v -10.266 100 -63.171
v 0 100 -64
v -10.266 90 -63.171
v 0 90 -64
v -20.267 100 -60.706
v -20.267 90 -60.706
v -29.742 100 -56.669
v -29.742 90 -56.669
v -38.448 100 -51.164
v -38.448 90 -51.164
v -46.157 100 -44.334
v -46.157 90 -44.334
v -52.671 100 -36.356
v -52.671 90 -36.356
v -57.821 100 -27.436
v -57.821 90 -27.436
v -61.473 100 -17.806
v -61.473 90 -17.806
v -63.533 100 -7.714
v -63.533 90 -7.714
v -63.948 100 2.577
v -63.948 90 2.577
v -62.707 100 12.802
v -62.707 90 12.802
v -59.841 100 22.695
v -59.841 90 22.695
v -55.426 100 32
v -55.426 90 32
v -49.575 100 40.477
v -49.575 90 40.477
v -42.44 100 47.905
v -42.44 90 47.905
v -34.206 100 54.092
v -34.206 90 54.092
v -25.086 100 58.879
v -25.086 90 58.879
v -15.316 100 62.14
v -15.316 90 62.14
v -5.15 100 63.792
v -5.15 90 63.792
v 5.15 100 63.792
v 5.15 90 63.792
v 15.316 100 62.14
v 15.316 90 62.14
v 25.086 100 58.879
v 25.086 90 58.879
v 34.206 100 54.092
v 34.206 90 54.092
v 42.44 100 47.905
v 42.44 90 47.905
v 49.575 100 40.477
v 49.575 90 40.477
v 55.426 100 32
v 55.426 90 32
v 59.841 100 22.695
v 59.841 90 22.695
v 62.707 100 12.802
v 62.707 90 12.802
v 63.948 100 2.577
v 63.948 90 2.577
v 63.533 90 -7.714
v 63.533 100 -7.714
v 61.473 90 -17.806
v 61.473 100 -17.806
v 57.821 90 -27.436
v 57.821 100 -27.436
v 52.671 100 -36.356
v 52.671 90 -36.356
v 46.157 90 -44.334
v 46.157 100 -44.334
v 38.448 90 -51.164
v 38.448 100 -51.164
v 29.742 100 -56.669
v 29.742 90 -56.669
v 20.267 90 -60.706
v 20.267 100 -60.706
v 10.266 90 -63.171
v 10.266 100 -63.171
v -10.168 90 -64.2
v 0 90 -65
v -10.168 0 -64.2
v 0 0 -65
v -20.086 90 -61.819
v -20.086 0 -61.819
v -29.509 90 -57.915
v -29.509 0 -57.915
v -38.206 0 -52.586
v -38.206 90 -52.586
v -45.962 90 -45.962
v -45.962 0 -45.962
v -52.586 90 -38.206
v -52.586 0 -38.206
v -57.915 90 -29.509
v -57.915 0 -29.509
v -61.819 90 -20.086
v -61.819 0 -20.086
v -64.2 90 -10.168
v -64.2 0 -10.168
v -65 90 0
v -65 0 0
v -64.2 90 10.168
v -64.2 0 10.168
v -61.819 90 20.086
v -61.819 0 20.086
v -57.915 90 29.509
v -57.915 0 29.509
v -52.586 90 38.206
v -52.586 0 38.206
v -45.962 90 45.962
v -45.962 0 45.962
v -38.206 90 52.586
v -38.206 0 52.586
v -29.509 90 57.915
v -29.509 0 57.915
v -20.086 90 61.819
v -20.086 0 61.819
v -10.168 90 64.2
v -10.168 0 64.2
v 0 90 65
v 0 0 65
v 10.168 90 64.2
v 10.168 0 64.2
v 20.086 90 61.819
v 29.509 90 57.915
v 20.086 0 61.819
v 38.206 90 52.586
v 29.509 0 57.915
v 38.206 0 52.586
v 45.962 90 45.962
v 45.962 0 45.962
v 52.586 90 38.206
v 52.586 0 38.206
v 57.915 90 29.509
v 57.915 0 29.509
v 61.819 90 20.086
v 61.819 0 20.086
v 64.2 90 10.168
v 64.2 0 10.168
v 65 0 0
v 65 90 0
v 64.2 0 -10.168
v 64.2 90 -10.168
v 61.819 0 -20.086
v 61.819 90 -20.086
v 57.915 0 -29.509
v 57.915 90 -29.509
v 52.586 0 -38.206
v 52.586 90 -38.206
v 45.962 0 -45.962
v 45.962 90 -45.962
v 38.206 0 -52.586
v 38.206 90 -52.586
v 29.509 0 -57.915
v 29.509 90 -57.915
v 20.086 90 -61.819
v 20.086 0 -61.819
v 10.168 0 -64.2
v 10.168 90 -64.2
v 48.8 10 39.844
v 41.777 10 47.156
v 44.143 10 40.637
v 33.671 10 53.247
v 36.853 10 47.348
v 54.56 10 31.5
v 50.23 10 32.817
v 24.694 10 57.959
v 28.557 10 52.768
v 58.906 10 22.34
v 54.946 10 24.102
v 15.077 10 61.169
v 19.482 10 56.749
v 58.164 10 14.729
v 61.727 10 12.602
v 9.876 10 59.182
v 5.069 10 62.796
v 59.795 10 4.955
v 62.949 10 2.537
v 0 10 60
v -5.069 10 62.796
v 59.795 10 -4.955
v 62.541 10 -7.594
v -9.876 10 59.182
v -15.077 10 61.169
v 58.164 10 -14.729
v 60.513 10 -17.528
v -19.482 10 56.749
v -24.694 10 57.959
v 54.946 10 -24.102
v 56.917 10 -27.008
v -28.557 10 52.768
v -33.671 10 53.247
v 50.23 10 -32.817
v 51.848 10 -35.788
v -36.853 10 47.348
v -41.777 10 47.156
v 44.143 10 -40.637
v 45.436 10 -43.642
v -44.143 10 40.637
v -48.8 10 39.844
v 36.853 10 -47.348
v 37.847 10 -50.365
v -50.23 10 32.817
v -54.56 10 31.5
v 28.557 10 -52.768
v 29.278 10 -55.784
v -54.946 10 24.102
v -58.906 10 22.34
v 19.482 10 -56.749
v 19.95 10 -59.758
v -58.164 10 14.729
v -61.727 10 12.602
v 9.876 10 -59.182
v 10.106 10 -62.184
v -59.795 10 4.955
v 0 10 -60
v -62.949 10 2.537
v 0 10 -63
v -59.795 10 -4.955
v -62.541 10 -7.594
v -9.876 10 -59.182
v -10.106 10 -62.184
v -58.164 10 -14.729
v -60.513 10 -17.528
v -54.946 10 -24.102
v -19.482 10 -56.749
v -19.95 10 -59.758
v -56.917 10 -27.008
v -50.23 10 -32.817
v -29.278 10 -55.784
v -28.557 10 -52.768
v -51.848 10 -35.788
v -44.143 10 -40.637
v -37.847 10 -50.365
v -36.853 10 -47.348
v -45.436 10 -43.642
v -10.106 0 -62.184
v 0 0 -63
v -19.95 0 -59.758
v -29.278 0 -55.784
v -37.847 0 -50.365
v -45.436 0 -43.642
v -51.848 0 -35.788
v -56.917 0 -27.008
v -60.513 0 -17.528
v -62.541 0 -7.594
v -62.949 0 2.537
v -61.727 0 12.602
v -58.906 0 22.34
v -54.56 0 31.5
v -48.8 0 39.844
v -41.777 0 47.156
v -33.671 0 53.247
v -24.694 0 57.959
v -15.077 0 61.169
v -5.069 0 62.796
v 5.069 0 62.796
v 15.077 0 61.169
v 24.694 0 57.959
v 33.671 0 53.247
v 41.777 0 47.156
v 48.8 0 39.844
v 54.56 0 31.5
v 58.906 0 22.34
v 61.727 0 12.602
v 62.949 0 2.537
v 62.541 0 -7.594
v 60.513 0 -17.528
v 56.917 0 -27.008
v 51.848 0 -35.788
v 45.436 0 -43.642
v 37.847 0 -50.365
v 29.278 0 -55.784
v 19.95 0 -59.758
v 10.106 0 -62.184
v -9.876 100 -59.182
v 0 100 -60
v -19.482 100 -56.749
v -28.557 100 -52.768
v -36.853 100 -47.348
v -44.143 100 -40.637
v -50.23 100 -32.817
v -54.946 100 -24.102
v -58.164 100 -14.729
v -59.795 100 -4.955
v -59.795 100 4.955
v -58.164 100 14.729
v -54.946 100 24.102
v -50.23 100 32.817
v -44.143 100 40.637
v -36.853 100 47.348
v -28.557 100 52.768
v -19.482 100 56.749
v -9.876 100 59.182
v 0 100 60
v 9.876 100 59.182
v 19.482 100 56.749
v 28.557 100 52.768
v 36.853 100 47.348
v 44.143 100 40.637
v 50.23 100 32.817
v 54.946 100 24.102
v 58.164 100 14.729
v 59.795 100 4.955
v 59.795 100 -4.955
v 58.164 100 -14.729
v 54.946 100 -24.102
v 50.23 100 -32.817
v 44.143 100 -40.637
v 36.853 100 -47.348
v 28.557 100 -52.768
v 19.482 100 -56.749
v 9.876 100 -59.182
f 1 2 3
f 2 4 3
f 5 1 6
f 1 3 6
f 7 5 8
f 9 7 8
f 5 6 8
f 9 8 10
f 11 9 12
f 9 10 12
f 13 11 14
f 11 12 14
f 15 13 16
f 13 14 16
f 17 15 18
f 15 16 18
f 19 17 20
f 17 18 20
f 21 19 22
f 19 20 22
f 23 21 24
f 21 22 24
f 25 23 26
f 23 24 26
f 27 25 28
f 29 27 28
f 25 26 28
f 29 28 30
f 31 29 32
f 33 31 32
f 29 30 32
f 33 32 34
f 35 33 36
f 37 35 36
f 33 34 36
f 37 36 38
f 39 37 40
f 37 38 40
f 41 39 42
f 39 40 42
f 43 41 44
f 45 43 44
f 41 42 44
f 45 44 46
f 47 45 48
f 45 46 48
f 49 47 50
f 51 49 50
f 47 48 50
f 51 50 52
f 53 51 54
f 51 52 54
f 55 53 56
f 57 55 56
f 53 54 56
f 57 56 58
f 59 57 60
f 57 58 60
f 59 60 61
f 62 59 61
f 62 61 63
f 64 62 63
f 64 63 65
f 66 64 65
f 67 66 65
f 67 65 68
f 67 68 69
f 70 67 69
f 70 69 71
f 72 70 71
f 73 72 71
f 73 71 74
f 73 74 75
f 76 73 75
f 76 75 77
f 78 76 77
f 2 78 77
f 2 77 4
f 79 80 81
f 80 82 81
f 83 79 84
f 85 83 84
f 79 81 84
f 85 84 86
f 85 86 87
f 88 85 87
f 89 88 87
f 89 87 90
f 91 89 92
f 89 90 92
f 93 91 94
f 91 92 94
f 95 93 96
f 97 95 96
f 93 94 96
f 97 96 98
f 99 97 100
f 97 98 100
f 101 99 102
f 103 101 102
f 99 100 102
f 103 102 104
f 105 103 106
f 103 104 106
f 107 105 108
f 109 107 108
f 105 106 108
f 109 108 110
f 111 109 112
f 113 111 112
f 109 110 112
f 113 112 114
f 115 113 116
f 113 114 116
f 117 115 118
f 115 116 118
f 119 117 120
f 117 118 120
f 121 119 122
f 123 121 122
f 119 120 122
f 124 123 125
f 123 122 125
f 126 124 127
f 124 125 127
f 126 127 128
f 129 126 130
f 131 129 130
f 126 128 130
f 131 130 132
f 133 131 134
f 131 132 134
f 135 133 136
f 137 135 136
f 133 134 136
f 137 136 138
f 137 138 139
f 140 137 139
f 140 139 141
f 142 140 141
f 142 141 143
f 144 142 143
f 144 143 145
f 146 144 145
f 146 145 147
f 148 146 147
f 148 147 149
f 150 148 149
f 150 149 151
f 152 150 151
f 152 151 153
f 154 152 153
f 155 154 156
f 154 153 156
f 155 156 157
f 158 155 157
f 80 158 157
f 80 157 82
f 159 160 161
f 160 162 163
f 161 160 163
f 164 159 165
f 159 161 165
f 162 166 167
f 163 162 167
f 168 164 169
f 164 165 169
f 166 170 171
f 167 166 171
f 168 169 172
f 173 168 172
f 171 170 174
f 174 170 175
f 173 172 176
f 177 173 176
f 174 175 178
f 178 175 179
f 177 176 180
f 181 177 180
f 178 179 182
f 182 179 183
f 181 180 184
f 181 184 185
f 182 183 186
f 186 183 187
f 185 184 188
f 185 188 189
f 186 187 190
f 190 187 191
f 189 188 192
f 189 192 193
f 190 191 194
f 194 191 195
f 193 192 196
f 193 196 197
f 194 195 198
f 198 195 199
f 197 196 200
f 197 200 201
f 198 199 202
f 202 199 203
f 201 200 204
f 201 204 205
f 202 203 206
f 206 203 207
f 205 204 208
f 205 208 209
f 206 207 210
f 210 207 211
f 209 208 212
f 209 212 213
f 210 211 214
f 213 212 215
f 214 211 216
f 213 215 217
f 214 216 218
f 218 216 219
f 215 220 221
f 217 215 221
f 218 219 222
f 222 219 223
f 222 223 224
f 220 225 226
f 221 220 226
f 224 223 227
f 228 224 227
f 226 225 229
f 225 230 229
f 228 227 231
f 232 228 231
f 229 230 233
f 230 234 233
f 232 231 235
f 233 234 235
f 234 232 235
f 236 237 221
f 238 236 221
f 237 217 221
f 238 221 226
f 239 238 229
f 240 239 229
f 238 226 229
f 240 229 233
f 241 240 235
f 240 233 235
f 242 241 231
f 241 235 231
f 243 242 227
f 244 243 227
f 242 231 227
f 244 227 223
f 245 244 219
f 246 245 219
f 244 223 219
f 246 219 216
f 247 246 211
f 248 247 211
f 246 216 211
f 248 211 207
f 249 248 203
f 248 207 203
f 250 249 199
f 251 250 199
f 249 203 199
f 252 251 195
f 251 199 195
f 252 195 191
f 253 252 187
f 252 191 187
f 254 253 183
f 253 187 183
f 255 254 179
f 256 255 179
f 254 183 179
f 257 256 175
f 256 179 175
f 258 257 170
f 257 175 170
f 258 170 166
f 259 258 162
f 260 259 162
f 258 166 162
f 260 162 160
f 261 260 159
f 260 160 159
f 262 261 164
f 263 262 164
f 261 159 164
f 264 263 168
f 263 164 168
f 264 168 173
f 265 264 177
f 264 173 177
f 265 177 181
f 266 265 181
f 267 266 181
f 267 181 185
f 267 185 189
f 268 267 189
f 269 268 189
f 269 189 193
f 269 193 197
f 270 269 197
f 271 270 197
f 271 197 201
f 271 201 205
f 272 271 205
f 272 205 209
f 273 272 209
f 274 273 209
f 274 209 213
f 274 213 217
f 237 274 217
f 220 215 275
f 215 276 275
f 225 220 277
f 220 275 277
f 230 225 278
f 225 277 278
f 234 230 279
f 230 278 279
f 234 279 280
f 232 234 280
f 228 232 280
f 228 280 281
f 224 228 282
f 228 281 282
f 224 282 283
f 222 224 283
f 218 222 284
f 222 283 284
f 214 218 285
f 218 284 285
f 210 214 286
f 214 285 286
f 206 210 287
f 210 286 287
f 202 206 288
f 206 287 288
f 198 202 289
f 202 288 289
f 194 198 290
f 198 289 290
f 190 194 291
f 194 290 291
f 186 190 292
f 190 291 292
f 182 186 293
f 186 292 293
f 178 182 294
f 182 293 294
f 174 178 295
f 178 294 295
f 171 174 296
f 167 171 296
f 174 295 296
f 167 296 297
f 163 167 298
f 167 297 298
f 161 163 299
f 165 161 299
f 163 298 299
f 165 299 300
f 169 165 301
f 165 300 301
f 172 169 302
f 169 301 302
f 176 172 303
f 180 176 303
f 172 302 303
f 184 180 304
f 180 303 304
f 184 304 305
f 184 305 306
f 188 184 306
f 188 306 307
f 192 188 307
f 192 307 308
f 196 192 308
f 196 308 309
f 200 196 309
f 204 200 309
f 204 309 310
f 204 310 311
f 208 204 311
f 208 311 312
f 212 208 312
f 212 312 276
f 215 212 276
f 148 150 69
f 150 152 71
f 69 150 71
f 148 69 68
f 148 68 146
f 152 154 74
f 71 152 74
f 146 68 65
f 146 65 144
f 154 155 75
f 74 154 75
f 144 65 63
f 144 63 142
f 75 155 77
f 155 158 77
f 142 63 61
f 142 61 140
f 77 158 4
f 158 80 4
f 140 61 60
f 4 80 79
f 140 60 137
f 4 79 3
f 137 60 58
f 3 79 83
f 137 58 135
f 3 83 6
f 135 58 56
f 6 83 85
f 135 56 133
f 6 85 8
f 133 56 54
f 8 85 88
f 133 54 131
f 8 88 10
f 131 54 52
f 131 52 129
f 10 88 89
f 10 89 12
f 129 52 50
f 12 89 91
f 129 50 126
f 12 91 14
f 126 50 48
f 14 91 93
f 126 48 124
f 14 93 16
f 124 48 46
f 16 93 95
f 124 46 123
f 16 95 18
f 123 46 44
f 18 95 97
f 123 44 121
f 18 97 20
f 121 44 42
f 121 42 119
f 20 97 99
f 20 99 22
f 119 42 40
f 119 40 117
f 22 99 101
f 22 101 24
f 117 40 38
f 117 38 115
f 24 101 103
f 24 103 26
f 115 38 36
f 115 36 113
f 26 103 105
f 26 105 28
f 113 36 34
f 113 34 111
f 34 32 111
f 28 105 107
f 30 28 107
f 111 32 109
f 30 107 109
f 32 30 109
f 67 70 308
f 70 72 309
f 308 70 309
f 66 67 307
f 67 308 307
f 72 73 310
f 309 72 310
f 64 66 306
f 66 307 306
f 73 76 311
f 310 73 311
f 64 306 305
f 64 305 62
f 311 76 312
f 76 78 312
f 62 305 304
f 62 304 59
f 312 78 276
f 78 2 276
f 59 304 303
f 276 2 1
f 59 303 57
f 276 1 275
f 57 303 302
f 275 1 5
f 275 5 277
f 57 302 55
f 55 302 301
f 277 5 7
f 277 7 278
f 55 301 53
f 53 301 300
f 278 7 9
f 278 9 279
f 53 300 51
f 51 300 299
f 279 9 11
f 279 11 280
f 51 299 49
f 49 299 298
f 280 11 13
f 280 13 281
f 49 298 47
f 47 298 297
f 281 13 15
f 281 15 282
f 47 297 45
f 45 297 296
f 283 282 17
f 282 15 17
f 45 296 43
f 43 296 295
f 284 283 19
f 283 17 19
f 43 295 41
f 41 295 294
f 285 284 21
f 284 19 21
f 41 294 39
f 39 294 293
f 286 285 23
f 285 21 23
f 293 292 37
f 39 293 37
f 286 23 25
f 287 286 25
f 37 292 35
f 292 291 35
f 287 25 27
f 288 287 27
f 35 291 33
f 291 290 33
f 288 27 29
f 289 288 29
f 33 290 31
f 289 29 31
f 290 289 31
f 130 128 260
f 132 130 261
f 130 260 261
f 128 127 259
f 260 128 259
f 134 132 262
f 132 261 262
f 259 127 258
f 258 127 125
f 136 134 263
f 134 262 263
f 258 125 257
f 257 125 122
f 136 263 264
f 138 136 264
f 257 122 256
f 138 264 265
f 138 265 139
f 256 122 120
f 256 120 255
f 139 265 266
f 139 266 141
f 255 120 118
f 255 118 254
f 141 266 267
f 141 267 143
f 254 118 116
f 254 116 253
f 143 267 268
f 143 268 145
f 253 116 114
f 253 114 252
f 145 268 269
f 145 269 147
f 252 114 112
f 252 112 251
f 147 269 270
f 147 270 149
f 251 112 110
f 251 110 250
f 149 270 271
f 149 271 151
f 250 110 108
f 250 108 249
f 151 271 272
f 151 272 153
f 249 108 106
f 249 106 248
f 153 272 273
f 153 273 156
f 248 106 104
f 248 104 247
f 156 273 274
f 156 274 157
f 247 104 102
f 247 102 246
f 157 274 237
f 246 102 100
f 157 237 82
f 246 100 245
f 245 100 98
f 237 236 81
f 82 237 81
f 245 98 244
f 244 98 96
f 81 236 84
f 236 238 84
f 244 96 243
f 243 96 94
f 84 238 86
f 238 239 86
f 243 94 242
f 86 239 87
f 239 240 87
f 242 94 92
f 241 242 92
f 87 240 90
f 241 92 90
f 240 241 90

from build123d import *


with BuildPart() as part:
    # Szkic1 → Obrót1 (revolve)
    with BuildSketch(Plane.XY, mode=Mode.PRIVATE) as obr_t1_sk:
        Polygon((-65, 0), (-63, 0), (-63, 10), (-60, 10), (-60, 100), (-64, 100), (-64, 90), (-65, 90), (-65, 10), align=None)
    revolve(obr_t1_sk.sketch.rotate(Axis((0, 0, 0), (0, 1, 0)), 270), axis=Axis((0, 0, 0), (0, 1, 0)))


solid = part.part
